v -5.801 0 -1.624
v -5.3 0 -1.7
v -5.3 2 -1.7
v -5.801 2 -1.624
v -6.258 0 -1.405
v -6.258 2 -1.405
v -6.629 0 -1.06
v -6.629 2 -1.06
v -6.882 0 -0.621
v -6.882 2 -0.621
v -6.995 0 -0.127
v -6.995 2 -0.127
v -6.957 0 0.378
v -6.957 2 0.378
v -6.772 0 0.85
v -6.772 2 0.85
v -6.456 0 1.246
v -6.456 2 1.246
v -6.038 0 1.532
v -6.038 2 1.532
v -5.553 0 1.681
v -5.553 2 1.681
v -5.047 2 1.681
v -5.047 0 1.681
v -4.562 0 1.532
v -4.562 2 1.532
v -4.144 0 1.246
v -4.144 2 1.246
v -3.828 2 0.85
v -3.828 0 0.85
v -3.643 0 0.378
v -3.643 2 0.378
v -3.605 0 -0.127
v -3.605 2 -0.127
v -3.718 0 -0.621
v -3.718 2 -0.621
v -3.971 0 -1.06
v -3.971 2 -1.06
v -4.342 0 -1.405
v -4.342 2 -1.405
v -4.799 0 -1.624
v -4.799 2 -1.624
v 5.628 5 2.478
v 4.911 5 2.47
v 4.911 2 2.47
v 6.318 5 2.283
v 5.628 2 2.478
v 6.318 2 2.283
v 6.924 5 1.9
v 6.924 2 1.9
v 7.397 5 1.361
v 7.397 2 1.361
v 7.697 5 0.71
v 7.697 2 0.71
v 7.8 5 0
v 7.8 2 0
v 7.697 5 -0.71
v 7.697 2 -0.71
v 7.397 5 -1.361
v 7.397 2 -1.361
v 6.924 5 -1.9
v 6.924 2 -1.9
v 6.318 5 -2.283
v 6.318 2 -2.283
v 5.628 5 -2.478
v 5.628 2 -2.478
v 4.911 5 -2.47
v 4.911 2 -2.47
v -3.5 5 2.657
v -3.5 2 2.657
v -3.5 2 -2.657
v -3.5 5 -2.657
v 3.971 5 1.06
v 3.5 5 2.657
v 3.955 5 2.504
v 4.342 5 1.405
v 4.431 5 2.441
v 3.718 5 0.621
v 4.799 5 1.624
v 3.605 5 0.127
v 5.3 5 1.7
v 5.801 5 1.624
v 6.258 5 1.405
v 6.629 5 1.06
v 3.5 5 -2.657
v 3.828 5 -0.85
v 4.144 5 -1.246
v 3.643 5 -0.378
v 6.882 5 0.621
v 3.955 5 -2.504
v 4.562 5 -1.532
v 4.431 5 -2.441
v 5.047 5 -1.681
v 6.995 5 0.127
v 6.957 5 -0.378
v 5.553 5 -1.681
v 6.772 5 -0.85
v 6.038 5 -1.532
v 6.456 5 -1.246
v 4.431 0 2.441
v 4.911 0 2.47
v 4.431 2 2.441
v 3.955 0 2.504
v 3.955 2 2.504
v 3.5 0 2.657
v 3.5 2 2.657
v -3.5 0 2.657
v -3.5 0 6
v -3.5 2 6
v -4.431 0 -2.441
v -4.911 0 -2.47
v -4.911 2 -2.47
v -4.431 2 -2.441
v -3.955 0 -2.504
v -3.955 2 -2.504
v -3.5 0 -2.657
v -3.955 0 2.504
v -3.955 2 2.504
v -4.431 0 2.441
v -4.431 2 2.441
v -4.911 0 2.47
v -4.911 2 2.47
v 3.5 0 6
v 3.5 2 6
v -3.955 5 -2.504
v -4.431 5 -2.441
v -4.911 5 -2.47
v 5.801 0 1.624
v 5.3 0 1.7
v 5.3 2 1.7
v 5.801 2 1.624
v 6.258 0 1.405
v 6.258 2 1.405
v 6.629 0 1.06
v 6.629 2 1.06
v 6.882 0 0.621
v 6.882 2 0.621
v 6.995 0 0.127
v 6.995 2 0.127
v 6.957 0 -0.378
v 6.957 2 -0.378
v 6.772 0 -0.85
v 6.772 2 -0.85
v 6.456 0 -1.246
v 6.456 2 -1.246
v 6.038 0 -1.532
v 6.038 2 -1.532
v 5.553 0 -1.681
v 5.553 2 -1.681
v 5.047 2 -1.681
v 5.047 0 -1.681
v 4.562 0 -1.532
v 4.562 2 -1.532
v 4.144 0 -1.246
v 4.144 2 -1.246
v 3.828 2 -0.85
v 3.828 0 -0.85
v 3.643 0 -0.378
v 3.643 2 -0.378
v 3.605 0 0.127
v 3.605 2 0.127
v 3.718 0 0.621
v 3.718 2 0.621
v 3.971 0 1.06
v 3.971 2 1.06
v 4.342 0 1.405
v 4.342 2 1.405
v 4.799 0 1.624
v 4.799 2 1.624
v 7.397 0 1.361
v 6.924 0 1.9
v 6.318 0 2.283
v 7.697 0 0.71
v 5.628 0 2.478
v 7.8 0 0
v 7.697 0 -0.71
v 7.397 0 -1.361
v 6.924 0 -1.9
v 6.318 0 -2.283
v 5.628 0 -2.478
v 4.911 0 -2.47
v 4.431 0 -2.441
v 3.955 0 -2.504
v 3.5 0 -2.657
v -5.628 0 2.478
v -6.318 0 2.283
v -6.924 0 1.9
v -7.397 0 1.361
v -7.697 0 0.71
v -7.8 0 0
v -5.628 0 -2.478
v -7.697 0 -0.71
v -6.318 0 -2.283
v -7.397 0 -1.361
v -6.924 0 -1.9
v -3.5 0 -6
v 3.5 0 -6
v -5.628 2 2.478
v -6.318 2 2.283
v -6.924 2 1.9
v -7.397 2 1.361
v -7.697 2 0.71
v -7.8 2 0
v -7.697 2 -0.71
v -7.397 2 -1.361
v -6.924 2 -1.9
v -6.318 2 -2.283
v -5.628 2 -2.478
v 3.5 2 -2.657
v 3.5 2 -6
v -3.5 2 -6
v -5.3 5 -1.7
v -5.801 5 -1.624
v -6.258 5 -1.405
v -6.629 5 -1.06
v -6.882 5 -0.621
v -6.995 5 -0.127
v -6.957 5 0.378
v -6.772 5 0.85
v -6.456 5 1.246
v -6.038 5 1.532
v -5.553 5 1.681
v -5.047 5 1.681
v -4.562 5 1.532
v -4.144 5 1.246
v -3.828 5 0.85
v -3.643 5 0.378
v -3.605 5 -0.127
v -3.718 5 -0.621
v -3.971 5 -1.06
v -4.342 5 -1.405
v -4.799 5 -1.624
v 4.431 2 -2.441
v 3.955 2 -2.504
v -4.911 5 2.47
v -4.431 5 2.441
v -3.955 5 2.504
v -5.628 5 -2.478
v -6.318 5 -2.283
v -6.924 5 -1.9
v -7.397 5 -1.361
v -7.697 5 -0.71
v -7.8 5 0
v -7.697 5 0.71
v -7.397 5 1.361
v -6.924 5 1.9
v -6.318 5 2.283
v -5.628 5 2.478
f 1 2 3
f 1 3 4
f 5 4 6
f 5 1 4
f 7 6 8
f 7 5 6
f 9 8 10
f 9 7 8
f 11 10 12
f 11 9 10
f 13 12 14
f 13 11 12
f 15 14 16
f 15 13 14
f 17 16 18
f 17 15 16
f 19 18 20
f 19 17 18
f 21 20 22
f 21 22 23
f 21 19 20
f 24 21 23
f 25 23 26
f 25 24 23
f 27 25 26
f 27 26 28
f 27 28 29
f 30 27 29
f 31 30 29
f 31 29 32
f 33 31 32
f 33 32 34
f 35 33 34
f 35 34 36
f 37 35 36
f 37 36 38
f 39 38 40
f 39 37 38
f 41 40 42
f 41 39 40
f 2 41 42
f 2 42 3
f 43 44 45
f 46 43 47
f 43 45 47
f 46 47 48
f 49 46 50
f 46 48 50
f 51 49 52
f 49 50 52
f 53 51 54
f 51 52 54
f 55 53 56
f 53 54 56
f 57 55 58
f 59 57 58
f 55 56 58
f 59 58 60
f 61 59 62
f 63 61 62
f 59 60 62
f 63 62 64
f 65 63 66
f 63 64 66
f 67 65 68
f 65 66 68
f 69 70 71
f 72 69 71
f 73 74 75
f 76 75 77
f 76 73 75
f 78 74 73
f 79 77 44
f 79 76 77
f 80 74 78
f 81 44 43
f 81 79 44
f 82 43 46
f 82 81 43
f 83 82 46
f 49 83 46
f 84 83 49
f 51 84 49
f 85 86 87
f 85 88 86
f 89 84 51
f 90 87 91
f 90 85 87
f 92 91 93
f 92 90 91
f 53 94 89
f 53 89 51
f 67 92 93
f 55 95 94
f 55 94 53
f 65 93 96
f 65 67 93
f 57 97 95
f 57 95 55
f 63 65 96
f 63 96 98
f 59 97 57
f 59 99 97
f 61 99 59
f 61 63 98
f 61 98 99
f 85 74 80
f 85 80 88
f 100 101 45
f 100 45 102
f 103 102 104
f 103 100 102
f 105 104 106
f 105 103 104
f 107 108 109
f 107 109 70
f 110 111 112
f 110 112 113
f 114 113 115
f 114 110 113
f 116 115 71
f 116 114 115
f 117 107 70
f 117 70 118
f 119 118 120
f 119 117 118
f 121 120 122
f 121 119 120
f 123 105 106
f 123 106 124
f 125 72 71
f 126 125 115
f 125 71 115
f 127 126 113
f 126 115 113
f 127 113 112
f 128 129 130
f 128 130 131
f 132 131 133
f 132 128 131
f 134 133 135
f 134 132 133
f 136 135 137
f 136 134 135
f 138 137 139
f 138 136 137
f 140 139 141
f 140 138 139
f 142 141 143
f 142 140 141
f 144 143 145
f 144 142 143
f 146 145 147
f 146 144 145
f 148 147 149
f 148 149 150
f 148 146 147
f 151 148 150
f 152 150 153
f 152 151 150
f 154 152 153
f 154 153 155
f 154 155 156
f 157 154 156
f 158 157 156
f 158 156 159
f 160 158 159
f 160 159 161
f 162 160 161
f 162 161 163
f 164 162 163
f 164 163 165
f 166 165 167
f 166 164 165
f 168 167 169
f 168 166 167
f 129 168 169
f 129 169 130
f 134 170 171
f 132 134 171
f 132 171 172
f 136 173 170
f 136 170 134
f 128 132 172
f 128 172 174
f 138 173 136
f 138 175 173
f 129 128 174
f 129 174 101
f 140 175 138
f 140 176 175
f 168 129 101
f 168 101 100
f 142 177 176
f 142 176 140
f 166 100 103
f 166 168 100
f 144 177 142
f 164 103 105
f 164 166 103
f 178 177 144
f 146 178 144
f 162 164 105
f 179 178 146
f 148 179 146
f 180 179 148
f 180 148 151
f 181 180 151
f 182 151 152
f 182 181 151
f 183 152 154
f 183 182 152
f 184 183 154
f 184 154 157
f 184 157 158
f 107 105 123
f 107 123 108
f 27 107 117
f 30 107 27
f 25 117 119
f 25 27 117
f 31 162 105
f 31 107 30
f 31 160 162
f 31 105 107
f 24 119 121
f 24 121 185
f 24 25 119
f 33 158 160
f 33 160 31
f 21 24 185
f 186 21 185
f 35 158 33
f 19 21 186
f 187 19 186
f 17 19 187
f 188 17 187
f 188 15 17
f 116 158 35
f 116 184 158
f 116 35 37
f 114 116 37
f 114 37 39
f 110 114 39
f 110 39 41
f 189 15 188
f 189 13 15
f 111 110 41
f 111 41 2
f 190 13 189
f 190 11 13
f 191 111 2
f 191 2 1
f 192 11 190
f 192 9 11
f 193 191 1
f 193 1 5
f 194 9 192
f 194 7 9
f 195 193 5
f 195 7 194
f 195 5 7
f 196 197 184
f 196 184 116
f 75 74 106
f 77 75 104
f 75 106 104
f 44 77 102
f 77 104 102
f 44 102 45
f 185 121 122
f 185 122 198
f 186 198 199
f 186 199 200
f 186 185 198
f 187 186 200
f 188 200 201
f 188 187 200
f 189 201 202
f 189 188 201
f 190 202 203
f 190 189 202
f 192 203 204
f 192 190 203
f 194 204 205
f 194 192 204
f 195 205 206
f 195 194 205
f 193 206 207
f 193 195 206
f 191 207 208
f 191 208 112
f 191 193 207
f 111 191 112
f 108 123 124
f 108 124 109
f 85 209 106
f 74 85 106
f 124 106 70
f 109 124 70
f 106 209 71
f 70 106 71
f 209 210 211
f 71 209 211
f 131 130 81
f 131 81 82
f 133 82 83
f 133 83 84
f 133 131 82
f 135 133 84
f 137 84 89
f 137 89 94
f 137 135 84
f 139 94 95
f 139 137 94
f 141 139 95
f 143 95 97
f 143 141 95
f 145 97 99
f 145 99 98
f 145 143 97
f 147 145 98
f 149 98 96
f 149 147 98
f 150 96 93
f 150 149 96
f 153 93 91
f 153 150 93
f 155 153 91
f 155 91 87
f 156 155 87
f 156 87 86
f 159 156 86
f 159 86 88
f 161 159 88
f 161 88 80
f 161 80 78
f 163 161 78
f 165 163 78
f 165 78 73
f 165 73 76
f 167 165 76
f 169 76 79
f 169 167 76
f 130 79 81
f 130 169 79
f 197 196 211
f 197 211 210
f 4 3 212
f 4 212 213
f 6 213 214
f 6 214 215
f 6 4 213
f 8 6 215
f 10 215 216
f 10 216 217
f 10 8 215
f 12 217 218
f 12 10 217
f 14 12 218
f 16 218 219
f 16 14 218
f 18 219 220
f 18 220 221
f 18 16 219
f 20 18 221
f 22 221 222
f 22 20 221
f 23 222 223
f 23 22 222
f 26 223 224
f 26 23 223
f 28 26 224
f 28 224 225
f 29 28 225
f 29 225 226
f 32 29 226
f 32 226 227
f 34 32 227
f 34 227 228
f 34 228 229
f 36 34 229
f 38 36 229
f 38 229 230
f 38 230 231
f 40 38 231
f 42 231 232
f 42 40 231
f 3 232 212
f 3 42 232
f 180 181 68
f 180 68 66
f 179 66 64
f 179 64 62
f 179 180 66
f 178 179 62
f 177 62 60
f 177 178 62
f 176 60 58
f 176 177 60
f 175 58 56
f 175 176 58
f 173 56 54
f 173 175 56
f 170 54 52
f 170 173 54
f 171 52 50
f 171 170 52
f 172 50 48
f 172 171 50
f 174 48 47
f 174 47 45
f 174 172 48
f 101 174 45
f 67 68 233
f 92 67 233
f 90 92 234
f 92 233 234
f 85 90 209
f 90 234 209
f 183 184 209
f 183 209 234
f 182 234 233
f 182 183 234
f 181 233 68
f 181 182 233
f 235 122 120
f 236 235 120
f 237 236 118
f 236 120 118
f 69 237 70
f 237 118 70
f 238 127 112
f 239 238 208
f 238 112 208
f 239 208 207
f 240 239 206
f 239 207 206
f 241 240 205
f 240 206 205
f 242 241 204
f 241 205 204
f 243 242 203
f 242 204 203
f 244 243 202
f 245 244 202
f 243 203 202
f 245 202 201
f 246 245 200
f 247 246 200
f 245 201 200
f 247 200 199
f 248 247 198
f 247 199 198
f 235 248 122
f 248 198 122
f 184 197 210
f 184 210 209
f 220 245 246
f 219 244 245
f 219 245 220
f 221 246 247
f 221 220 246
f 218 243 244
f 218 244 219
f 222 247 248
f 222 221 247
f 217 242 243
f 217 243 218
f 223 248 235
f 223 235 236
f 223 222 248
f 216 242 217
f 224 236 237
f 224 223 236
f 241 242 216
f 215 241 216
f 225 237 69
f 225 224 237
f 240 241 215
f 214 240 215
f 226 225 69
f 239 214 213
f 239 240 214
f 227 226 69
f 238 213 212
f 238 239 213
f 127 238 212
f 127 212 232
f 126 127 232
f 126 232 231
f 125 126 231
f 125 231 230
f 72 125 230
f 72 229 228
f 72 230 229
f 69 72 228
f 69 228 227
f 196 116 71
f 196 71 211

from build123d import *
from build123d.topology import SkipClean

# Parameters (mm, degrees)
CROQUIS1_R              = 1.7
SALIENTE_EXTRUIR1_DEPTH = 2
CROQUIS5_R              = 1.7
BOSS_EXTRUDE1_DEPTH     = 3


with BuildPart() as part:
    # Croquis1 → Saliente-Extruir1 (new body)
    with BuildSketch(Plane(origin=(0, 0, 0), x_dir=(1, 0, 0), z_dir=(0, 1, 0))):
        with BuildLine():
            Line((-3.5, 6), (3.5, 6))
            Line((3.5, 6), (3.5, 2.657498126))
            ThreePointArc((3.5, 2.657498126), (4.191822894, 2.460979566), (4.910964812, 2.469544821))
            ThreePointArc((4.910964812, 2.469544821), (7.8, 0), (4.910964812, -2.469544821))
            ThreePointArc((4.910964812, -2.469544821), (4.191822894, -2.460979566), (3.5, -2.657498126))
            Line((3.5, -2.657498126), (3.5, -6))
            Line((3.5, -6), (-3.5, -6))
            Line((-3.5, -6), (-3.5, -2.657498126))
            ThreePointArc((-3.5, -2.657498126), (-4.191822894, -2.460979566), (-4.910964812, -2.469544821))
            ThreePointArc((-4.910964812, -2.469544821), (-7.8, 0), (-4.910964812, 2.469544821))
            ThreePointArc((-4.910964812, 2.469544821), (-4.191822894, 2.460979566), (-3.5, 2.657498126))
            Line((-3.5, 2.657498126), (-3.5, 6))
        make_face()
        with Locations((5.3, 0)):
            Circle(CROQUIS1_R, mode=Mode.SUBTRACT)
        with Locations((-5.3, 0)):
            Circle(CROQUIS1_R, mode=Mode.SUBTRACT)
    extrude(amount=SALIENTE_EXTRUIR1_DEPTH)

    # Croquis5 → Boss-Extrude1 (add)
    # profile 1 of 2: a face of its own
    with SkipClean():  # the faces are left unmerged after this step: merging them gives an invalid solid
        with BuildSketch(Plane(origin=(0, 2, 0), x_dir=(1, 0, 0), z_dir=(0, 1, 0))):
            with BuildLine():
                Line((3.5, 2.657498126), (3.5, -2.657498126))
                ThreePointArc((3.5, -2.657498126), (4.191822894, -2.460979566), (4.910964812, -2.469544821))
                ThreePointArc((4.910964812, -2.469544821), (7.8, 0), (4.910964812, 2.469544821))
                ThreePointArc((4.910964812, 2.469544821), (4.191822894, 2.460979566), (3.5, 2.657498126))
            make_face()
            with Locations((5.3, 0)):
                Circle(CROQUIS5_R, mode=Mode.SUBTRACT)
        # profile 2 of 2: a face of its own
        with BuildSketch(Plane(origin=(0, 2, 0), x_dir=(1, 0, 0), z_dir=(0, 1, 0))):
            with BuildLine():
                ThreePointArc((-4.910964812, -2.469544821), (-4.191822894, -2.460979566), (-3.5, -2.657498126))
                Line((-3.5, -2.657498126), (-3.5, 2.657498126))
                ThreePointArc((-3.5, 2.657498126), (-4.191822894, 2.460979566), (-4.910964812, 2.469544821))
                ThreePointArc((-4.910964812, 2.469544821), (-7.8, 0), (-4.910964812, -2.469544821))
            make_face()
            with Locations((-5.3, 0)):
                Circle(CROQUIS5_R, mode=Mode.SUBTRACT)
        extrude(amount=BOSS_EXTRUDE1_DEPTH)


solid = part.part
